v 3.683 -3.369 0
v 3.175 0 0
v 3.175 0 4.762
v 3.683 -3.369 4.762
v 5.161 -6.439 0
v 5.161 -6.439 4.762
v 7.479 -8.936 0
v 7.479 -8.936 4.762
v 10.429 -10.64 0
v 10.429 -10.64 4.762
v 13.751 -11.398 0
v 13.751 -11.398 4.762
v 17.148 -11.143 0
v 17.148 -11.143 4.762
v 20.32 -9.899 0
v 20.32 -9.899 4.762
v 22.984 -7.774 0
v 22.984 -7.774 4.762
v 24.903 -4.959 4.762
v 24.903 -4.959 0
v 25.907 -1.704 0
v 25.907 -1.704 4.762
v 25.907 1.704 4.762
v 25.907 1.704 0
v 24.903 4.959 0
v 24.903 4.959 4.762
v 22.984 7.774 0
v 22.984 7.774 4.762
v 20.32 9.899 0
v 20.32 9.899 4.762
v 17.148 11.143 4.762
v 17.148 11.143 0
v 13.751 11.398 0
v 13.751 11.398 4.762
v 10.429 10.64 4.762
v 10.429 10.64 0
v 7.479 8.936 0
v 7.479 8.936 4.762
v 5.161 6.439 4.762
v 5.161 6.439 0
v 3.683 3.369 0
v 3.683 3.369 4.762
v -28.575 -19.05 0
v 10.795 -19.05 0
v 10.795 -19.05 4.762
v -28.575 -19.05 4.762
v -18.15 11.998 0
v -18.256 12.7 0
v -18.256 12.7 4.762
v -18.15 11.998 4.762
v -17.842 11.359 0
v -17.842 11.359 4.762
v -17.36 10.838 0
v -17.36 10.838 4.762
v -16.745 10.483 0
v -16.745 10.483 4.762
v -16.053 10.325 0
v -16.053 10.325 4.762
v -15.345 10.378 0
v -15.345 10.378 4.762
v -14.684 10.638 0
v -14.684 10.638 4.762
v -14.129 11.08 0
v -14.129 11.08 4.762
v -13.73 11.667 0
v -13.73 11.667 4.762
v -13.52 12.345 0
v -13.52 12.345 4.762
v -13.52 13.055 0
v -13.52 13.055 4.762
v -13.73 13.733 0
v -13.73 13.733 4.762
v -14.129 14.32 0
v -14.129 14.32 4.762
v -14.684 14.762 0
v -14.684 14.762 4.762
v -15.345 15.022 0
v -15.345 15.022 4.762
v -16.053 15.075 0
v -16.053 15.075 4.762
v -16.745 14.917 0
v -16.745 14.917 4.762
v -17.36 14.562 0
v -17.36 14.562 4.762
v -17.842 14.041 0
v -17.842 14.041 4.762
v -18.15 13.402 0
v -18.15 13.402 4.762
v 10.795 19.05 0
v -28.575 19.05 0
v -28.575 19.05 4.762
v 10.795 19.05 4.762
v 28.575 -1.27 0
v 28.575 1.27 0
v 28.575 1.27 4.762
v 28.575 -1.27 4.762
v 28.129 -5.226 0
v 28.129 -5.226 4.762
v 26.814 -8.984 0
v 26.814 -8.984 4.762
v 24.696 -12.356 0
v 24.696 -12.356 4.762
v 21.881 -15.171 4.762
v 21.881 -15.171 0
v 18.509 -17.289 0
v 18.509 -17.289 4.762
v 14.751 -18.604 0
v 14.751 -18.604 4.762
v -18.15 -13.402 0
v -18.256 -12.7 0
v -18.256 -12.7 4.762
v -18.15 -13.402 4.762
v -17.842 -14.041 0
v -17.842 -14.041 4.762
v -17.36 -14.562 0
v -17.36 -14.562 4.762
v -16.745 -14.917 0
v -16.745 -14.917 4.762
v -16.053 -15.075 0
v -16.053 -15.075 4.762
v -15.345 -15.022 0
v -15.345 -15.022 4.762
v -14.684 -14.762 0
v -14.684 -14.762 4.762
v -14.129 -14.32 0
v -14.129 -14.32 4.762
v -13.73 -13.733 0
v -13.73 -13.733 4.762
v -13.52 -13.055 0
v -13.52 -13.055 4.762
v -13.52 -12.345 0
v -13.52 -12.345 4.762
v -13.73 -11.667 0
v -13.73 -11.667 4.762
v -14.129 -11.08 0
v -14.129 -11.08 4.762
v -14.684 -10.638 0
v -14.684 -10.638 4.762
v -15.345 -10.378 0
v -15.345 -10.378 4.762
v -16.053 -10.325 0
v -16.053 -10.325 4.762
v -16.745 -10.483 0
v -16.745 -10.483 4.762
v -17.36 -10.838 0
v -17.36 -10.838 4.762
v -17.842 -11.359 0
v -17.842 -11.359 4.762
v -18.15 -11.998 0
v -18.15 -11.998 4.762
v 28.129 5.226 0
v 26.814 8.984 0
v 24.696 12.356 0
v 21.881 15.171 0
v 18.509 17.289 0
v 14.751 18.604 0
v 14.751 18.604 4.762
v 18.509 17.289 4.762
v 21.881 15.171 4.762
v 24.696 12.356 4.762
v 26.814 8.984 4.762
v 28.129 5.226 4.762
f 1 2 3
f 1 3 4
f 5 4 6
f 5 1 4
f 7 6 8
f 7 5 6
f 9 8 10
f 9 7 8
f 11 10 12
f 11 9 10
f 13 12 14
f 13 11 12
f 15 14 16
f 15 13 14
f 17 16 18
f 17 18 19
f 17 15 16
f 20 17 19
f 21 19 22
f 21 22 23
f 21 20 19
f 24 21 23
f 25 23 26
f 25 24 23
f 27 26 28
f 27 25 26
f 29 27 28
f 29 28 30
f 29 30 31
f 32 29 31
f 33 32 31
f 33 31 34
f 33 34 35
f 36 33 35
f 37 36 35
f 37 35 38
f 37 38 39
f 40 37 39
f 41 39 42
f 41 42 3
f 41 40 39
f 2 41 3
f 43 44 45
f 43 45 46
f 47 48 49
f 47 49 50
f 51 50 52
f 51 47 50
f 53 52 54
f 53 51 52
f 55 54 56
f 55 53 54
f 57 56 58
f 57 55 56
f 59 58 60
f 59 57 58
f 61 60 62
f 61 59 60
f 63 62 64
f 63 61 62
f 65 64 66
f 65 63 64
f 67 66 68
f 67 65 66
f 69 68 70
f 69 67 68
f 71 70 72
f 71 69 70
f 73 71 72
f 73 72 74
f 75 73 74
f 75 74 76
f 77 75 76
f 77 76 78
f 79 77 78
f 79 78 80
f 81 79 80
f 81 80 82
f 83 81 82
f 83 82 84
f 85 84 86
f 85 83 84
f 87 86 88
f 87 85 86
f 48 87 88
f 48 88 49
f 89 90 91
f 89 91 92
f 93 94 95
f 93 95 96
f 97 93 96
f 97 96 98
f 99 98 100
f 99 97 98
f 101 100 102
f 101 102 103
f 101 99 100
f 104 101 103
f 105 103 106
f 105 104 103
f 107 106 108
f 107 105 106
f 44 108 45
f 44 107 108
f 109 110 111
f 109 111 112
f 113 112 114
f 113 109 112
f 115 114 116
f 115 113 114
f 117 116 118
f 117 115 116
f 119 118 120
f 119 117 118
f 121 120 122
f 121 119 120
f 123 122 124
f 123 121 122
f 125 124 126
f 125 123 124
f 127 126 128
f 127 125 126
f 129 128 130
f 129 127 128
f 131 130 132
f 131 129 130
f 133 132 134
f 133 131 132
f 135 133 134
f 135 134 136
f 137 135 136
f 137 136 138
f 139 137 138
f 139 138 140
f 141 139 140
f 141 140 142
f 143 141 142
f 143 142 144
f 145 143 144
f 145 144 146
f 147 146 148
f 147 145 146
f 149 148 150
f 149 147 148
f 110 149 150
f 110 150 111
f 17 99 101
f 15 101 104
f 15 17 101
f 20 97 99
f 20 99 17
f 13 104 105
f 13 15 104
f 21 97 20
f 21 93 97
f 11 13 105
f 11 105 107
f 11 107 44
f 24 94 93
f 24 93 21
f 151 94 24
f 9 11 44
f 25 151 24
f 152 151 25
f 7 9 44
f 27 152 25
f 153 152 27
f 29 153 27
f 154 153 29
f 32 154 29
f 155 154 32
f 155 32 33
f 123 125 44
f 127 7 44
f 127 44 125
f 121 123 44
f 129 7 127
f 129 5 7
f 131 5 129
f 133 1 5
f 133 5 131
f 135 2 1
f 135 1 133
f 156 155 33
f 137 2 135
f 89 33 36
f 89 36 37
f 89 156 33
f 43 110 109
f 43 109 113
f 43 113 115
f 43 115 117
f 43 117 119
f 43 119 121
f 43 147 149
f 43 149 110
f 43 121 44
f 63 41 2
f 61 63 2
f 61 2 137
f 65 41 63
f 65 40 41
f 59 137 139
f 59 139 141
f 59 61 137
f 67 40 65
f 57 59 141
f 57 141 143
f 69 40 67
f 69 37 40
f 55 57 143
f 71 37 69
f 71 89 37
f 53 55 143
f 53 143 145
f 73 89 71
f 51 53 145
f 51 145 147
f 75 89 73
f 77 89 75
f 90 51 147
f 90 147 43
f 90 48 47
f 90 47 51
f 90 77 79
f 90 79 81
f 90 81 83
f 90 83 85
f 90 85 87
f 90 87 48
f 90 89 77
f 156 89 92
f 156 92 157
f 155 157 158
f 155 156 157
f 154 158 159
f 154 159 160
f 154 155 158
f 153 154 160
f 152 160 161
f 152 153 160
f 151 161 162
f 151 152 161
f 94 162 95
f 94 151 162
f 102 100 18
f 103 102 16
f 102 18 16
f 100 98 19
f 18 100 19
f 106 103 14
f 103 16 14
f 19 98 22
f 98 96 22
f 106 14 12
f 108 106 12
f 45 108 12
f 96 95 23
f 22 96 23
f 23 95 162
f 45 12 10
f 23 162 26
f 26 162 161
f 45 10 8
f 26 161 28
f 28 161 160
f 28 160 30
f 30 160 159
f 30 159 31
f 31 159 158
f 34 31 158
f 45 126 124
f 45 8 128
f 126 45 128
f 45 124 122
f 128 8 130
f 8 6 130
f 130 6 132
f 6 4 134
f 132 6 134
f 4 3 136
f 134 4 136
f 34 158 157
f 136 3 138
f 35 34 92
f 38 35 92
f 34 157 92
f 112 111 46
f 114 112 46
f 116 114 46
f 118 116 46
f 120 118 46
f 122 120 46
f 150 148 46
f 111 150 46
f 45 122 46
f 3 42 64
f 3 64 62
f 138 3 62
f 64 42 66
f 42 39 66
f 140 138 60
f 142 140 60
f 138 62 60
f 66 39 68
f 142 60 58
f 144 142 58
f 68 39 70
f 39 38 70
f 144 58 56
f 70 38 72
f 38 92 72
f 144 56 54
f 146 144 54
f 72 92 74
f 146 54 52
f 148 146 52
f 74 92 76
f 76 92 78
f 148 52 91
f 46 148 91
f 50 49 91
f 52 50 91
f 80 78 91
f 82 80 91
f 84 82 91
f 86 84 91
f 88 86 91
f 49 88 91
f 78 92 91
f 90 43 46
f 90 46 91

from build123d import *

# Parameters (mm, degrees)
SKETCH1_R           = 11.43
SKETCH1_R_2         = 2.38125
BOSS_EXTRUDE1_DEPTH = 4.7625


with BuildPart() as part:
    # Sketch1 → Boss-Extrude1 (new body)
    with BuildSketch(Plane.XY):
        with BuildLine():
            Line((-28.575, 19.05), (10.795, 19.05))
            ThreePointArc((10.795, 19.05), (23.367358569, 13.842358569), (28.575, 1.27))
            Line((28.575, 1.27), (28.575, -1.27))
            ThreePointArc((28.575, -1.27), (23.367358569, -13.842358569), (10.795, -19.05))
            Line((10.795, -19.05), (-28.575, -19.05))
            Line((-28.575, -19.05), (-28.575, 19.05))
        make_face()
        with Locations(Location((14.605, 0, 0), (0, 0, 180))):
            Circle(SKETCH1_R, mode=Mode.SUBTRACT)
        with Locations(Location((-15.875, 12.7, 0), (0, 0, 180))):
            Circle(SKETCH1_R_2, mode=Mode.SUBTRACT)
        with Locations(Location((-15.875, -12.7, 0), (0, 0, 180))):
            Circle(SKETCH1_R_2, mode=Mode.SUBTRACT)
    extrude(amount=BOSS_EXTRUDE1_DEPTH)


solid = part.part
